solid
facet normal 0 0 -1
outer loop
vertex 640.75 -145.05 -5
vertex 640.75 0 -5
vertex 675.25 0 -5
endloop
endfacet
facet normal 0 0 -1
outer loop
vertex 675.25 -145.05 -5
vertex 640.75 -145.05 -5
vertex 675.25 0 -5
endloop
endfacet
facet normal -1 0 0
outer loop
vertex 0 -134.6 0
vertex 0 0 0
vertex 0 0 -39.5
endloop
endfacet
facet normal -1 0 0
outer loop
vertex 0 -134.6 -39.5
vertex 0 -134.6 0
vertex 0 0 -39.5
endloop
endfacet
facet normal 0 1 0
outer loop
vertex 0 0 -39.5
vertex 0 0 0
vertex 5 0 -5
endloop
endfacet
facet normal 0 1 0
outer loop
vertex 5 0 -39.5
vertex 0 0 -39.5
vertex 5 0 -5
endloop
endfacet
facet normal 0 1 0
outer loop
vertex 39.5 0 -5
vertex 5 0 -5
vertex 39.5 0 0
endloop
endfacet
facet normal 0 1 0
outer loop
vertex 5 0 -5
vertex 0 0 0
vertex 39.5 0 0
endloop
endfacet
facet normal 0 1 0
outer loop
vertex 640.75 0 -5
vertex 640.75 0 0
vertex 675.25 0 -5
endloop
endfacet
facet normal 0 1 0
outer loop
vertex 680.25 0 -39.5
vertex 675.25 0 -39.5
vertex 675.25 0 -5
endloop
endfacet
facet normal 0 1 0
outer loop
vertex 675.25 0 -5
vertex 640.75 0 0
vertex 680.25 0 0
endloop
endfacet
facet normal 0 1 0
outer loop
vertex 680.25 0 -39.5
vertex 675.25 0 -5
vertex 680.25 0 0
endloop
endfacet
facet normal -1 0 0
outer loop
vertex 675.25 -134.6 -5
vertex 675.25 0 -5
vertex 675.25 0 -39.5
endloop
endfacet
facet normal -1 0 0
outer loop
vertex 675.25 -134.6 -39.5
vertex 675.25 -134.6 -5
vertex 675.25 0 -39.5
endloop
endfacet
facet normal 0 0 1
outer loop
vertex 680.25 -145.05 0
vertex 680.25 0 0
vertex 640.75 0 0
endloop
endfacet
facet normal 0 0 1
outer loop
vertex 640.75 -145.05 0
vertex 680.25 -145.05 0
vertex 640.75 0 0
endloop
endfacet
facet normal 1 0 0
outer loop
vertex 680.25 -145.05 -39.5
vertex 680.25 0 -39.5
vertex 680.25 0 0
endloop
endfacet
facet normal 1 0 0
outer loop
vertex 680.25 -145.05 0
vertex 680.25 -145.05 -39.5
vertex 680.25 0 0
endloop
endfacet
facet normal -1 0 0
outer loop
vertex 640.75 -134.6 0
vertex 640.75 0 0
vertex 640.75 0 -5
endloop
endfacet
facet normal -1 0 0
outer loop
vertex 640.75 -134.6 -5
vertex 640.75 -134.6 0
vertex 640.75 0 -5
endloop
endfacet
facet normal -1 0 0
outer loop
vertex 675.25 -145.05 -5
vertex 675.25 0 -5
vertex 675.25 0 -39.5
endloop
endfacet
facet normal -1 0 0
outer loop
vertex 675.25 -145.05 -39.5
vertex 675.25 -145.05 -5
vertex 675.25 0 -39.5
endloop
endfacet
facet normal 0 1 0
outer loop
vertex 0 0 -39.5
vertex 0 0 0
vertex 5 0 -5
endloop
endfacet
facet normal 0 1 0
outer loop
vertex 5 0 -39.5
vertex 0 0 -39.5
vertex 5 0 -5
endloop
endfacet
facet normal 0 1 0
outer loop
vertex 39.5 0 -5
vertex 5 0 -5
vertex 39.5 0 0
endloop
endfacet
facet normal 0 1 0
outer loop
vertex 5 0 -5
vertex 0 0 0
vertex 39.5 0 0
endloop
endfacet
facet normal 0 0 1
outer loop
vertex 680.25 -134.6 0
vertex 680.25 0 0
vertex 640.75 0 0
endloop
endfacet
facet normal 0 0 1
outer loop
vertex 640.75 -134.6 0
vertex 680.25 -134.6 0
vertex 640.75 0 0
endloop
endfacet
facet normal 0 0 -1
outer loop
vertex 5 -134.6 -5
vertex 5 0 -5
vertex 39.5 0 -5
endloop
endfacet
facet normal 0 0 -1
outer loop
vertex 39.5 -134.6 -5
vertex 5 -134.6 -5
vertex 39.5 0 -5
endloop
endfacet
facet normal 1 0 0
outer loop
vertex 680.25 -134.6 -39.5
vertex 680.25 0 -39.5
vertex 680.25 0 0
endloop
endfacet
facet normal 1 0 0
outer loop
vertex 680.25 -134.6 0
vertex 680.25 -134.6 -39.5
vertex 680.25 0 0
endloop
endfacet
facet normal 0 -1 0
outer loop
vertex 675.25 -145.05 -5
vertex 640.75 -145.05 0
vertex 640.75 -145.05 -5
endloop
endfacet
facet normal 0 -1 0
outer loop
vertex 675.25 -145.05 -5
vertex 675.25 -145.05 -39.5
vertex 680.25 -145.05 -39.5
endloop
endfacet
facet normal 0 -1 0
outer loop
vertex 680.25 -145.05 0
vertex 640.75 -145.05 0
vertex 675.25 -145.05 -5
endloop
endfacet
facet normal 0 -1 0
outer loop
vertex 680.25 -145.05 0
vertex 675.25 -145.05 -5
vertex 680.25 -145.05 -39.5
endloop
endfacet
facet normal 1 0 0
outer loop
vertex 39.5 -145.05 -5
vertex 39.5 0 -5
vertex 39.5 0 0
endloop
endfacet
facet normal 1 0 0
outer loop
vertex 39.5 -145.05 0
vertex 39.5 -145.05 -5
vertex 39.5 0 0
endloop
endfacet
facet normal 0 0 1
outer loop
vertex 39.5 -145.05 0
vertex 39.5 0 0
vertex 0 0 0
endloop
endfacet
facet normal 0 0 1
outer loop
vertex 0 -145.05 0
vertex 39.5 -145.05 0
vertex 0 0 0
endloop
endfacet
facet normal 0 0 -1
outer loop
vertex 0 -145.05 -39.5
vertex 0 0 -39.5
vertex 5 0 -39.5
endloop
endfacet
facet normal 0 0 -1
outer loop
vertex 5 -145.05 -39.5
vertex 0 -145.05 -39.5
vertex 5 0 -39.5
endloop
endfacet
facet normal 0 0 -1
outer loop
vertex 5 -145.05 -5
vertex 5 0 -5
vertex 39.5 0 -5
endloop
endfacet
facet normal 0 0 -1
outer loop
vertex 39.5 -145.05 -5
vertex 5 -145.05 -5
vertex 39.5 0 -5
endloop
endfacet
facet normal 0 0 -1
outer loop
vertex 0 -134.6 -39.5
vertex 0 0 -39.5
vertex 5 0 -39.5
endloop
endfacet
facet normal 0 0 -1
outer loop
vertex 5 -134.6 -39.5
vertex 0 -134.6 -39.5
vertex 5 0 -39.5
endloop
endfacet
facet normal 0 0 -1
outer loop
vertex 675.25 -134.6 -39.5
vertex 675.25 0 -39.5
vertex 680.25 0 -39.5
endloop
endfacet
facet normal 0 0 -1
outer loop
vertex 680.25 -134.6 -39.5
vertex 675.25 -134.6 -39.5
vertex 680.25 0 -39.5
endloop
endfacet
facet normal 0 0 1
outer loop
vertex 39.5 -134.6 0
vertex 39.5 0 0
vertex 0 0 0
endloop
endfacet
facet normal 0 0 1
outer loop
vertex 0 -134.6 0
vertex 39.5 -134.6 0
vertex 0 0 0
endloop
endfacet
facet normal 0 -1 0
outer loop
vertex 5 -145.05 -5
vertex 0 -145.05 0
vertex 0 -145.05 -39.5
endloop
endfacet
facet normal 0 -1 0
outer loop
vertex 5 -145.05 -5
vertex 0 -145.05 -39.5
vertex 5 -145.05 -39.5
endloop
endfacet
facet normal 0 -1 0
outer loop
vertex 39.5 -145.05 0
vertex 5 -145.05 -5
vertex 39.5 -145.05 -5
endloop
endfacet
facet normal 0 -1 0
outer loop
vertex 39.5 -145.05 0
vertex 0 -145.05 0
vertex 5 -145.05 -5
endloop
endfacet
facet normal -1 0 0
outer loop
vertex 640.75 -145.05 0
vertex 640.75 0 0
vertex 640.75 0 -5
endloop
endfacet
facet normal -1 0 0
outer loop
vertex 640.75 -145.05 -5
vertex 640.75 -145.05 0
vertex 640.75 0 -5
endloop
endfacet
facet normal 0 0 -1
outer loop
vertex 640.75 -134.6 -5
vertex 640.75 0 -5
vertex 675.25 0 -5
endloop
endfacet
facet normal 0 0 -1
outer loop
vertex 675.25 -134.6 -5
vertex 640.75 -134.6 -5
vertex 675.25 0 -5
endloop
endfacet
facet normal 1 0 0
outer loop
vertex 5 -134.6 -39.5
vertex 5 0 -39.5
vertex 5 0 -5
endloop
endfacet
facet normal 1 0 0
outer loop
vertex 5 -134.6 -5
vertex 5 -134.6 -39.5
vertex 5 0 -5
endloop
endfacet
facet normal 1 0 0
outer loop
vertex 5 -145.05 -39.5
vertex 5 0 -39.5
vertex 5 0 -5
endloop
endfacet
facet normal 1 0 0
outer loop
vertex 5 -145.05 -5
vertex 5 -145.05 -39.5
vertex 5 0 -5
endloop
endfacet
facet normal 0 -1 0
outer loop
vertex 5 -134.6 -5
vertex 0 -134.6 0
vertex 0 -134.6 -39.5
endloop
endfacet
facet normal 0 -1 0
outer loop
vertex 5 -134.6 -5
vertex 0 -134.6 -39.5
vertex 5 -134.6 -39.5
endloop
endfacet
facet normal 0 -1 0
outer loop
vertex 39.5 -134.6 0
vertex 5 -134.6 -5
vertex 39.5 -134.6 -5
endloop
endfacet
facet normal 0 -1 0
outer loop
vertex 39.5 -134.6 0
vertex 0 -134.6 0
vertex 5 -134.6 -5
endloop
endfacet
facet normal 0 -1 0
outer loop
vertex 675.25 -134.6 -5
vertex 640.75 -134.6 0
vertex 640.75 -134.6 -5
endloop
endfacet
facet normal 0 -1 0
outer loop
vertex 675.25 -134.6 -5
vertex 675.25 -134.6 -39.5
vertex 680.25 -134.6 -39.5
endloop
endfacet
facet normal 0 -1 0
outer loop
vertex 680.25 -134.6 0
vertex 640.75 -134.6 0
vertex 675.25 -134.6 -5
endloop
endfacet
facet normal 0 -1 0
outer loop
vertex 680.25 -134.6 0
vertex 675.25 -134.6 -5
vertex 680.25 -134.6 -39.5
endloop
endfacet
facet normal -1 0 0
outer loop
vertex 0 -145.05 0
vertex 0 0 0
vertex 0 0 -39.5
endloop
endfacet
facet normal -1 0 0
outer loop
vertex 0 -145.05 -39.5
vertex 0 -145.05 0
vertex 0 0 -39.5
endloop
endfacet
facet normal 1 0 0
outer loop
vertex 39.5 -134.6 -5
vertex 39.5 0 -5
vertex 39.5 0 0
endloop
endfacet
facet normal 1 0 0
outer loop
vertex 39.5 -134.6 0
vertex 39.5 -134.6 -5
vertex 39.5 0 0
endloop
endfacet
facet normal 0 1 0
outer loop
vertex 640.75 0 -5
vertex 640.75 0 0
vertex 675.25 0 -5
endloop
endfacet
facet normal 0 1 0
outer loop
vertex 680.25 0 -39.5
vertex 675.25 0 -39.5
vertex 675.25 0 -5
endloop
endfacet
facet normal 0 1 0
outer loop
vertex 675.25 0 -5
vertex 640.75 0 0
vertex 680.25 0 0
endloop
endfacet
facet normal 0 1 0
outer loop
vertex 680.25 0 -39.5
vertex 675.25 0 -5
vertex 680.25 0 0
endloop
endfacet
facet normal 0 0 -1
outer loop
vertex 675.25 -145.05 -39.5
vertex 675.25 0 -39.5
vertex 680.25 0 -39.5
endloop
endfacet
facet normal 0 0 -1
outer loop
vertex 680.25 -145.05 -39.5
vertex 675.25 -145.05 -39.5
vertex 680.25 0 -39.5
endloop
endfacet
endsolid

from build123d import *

# Parameters (mm, degrees)
F1_DEPTH = 145.05
F2_DEPTH = 134.6


with BuildPart() as f1:
    # F0 (on Front) → F1 (new body)
    with BuildSketch(Plane.XZ):
        Polygon((39.5, 0), (0, 0), (0, -39.5), (5, -39.5), (5, -5), (39.5, -5), align=None)
        Polygon((680.25, -39.5), (680.25, 0), (640.75, 0), (640.75, -5), (675.25, -5), (675.25, -39.5), align=None)
    extrude(amount=F1_DEPTH)


with BuildPart() as f2:
    # F0 (on Front) → F2 (new body)
    with BuildSketch(Plane.XZ):
        Polygon((39.5, 0), (0, 0), (0, -39.5), (5, -39.5), (5, -5), (39.5, -5), align=None)
        Polygon((680.25, -39.5), (680.25, 0), (640.75, 0), (640.75, -5), (675.25, -5), (675.25, -39.5), align=None)
    extrude(amount=F2_DEPTH)


solid = Compound([f1.part, f2.part])
